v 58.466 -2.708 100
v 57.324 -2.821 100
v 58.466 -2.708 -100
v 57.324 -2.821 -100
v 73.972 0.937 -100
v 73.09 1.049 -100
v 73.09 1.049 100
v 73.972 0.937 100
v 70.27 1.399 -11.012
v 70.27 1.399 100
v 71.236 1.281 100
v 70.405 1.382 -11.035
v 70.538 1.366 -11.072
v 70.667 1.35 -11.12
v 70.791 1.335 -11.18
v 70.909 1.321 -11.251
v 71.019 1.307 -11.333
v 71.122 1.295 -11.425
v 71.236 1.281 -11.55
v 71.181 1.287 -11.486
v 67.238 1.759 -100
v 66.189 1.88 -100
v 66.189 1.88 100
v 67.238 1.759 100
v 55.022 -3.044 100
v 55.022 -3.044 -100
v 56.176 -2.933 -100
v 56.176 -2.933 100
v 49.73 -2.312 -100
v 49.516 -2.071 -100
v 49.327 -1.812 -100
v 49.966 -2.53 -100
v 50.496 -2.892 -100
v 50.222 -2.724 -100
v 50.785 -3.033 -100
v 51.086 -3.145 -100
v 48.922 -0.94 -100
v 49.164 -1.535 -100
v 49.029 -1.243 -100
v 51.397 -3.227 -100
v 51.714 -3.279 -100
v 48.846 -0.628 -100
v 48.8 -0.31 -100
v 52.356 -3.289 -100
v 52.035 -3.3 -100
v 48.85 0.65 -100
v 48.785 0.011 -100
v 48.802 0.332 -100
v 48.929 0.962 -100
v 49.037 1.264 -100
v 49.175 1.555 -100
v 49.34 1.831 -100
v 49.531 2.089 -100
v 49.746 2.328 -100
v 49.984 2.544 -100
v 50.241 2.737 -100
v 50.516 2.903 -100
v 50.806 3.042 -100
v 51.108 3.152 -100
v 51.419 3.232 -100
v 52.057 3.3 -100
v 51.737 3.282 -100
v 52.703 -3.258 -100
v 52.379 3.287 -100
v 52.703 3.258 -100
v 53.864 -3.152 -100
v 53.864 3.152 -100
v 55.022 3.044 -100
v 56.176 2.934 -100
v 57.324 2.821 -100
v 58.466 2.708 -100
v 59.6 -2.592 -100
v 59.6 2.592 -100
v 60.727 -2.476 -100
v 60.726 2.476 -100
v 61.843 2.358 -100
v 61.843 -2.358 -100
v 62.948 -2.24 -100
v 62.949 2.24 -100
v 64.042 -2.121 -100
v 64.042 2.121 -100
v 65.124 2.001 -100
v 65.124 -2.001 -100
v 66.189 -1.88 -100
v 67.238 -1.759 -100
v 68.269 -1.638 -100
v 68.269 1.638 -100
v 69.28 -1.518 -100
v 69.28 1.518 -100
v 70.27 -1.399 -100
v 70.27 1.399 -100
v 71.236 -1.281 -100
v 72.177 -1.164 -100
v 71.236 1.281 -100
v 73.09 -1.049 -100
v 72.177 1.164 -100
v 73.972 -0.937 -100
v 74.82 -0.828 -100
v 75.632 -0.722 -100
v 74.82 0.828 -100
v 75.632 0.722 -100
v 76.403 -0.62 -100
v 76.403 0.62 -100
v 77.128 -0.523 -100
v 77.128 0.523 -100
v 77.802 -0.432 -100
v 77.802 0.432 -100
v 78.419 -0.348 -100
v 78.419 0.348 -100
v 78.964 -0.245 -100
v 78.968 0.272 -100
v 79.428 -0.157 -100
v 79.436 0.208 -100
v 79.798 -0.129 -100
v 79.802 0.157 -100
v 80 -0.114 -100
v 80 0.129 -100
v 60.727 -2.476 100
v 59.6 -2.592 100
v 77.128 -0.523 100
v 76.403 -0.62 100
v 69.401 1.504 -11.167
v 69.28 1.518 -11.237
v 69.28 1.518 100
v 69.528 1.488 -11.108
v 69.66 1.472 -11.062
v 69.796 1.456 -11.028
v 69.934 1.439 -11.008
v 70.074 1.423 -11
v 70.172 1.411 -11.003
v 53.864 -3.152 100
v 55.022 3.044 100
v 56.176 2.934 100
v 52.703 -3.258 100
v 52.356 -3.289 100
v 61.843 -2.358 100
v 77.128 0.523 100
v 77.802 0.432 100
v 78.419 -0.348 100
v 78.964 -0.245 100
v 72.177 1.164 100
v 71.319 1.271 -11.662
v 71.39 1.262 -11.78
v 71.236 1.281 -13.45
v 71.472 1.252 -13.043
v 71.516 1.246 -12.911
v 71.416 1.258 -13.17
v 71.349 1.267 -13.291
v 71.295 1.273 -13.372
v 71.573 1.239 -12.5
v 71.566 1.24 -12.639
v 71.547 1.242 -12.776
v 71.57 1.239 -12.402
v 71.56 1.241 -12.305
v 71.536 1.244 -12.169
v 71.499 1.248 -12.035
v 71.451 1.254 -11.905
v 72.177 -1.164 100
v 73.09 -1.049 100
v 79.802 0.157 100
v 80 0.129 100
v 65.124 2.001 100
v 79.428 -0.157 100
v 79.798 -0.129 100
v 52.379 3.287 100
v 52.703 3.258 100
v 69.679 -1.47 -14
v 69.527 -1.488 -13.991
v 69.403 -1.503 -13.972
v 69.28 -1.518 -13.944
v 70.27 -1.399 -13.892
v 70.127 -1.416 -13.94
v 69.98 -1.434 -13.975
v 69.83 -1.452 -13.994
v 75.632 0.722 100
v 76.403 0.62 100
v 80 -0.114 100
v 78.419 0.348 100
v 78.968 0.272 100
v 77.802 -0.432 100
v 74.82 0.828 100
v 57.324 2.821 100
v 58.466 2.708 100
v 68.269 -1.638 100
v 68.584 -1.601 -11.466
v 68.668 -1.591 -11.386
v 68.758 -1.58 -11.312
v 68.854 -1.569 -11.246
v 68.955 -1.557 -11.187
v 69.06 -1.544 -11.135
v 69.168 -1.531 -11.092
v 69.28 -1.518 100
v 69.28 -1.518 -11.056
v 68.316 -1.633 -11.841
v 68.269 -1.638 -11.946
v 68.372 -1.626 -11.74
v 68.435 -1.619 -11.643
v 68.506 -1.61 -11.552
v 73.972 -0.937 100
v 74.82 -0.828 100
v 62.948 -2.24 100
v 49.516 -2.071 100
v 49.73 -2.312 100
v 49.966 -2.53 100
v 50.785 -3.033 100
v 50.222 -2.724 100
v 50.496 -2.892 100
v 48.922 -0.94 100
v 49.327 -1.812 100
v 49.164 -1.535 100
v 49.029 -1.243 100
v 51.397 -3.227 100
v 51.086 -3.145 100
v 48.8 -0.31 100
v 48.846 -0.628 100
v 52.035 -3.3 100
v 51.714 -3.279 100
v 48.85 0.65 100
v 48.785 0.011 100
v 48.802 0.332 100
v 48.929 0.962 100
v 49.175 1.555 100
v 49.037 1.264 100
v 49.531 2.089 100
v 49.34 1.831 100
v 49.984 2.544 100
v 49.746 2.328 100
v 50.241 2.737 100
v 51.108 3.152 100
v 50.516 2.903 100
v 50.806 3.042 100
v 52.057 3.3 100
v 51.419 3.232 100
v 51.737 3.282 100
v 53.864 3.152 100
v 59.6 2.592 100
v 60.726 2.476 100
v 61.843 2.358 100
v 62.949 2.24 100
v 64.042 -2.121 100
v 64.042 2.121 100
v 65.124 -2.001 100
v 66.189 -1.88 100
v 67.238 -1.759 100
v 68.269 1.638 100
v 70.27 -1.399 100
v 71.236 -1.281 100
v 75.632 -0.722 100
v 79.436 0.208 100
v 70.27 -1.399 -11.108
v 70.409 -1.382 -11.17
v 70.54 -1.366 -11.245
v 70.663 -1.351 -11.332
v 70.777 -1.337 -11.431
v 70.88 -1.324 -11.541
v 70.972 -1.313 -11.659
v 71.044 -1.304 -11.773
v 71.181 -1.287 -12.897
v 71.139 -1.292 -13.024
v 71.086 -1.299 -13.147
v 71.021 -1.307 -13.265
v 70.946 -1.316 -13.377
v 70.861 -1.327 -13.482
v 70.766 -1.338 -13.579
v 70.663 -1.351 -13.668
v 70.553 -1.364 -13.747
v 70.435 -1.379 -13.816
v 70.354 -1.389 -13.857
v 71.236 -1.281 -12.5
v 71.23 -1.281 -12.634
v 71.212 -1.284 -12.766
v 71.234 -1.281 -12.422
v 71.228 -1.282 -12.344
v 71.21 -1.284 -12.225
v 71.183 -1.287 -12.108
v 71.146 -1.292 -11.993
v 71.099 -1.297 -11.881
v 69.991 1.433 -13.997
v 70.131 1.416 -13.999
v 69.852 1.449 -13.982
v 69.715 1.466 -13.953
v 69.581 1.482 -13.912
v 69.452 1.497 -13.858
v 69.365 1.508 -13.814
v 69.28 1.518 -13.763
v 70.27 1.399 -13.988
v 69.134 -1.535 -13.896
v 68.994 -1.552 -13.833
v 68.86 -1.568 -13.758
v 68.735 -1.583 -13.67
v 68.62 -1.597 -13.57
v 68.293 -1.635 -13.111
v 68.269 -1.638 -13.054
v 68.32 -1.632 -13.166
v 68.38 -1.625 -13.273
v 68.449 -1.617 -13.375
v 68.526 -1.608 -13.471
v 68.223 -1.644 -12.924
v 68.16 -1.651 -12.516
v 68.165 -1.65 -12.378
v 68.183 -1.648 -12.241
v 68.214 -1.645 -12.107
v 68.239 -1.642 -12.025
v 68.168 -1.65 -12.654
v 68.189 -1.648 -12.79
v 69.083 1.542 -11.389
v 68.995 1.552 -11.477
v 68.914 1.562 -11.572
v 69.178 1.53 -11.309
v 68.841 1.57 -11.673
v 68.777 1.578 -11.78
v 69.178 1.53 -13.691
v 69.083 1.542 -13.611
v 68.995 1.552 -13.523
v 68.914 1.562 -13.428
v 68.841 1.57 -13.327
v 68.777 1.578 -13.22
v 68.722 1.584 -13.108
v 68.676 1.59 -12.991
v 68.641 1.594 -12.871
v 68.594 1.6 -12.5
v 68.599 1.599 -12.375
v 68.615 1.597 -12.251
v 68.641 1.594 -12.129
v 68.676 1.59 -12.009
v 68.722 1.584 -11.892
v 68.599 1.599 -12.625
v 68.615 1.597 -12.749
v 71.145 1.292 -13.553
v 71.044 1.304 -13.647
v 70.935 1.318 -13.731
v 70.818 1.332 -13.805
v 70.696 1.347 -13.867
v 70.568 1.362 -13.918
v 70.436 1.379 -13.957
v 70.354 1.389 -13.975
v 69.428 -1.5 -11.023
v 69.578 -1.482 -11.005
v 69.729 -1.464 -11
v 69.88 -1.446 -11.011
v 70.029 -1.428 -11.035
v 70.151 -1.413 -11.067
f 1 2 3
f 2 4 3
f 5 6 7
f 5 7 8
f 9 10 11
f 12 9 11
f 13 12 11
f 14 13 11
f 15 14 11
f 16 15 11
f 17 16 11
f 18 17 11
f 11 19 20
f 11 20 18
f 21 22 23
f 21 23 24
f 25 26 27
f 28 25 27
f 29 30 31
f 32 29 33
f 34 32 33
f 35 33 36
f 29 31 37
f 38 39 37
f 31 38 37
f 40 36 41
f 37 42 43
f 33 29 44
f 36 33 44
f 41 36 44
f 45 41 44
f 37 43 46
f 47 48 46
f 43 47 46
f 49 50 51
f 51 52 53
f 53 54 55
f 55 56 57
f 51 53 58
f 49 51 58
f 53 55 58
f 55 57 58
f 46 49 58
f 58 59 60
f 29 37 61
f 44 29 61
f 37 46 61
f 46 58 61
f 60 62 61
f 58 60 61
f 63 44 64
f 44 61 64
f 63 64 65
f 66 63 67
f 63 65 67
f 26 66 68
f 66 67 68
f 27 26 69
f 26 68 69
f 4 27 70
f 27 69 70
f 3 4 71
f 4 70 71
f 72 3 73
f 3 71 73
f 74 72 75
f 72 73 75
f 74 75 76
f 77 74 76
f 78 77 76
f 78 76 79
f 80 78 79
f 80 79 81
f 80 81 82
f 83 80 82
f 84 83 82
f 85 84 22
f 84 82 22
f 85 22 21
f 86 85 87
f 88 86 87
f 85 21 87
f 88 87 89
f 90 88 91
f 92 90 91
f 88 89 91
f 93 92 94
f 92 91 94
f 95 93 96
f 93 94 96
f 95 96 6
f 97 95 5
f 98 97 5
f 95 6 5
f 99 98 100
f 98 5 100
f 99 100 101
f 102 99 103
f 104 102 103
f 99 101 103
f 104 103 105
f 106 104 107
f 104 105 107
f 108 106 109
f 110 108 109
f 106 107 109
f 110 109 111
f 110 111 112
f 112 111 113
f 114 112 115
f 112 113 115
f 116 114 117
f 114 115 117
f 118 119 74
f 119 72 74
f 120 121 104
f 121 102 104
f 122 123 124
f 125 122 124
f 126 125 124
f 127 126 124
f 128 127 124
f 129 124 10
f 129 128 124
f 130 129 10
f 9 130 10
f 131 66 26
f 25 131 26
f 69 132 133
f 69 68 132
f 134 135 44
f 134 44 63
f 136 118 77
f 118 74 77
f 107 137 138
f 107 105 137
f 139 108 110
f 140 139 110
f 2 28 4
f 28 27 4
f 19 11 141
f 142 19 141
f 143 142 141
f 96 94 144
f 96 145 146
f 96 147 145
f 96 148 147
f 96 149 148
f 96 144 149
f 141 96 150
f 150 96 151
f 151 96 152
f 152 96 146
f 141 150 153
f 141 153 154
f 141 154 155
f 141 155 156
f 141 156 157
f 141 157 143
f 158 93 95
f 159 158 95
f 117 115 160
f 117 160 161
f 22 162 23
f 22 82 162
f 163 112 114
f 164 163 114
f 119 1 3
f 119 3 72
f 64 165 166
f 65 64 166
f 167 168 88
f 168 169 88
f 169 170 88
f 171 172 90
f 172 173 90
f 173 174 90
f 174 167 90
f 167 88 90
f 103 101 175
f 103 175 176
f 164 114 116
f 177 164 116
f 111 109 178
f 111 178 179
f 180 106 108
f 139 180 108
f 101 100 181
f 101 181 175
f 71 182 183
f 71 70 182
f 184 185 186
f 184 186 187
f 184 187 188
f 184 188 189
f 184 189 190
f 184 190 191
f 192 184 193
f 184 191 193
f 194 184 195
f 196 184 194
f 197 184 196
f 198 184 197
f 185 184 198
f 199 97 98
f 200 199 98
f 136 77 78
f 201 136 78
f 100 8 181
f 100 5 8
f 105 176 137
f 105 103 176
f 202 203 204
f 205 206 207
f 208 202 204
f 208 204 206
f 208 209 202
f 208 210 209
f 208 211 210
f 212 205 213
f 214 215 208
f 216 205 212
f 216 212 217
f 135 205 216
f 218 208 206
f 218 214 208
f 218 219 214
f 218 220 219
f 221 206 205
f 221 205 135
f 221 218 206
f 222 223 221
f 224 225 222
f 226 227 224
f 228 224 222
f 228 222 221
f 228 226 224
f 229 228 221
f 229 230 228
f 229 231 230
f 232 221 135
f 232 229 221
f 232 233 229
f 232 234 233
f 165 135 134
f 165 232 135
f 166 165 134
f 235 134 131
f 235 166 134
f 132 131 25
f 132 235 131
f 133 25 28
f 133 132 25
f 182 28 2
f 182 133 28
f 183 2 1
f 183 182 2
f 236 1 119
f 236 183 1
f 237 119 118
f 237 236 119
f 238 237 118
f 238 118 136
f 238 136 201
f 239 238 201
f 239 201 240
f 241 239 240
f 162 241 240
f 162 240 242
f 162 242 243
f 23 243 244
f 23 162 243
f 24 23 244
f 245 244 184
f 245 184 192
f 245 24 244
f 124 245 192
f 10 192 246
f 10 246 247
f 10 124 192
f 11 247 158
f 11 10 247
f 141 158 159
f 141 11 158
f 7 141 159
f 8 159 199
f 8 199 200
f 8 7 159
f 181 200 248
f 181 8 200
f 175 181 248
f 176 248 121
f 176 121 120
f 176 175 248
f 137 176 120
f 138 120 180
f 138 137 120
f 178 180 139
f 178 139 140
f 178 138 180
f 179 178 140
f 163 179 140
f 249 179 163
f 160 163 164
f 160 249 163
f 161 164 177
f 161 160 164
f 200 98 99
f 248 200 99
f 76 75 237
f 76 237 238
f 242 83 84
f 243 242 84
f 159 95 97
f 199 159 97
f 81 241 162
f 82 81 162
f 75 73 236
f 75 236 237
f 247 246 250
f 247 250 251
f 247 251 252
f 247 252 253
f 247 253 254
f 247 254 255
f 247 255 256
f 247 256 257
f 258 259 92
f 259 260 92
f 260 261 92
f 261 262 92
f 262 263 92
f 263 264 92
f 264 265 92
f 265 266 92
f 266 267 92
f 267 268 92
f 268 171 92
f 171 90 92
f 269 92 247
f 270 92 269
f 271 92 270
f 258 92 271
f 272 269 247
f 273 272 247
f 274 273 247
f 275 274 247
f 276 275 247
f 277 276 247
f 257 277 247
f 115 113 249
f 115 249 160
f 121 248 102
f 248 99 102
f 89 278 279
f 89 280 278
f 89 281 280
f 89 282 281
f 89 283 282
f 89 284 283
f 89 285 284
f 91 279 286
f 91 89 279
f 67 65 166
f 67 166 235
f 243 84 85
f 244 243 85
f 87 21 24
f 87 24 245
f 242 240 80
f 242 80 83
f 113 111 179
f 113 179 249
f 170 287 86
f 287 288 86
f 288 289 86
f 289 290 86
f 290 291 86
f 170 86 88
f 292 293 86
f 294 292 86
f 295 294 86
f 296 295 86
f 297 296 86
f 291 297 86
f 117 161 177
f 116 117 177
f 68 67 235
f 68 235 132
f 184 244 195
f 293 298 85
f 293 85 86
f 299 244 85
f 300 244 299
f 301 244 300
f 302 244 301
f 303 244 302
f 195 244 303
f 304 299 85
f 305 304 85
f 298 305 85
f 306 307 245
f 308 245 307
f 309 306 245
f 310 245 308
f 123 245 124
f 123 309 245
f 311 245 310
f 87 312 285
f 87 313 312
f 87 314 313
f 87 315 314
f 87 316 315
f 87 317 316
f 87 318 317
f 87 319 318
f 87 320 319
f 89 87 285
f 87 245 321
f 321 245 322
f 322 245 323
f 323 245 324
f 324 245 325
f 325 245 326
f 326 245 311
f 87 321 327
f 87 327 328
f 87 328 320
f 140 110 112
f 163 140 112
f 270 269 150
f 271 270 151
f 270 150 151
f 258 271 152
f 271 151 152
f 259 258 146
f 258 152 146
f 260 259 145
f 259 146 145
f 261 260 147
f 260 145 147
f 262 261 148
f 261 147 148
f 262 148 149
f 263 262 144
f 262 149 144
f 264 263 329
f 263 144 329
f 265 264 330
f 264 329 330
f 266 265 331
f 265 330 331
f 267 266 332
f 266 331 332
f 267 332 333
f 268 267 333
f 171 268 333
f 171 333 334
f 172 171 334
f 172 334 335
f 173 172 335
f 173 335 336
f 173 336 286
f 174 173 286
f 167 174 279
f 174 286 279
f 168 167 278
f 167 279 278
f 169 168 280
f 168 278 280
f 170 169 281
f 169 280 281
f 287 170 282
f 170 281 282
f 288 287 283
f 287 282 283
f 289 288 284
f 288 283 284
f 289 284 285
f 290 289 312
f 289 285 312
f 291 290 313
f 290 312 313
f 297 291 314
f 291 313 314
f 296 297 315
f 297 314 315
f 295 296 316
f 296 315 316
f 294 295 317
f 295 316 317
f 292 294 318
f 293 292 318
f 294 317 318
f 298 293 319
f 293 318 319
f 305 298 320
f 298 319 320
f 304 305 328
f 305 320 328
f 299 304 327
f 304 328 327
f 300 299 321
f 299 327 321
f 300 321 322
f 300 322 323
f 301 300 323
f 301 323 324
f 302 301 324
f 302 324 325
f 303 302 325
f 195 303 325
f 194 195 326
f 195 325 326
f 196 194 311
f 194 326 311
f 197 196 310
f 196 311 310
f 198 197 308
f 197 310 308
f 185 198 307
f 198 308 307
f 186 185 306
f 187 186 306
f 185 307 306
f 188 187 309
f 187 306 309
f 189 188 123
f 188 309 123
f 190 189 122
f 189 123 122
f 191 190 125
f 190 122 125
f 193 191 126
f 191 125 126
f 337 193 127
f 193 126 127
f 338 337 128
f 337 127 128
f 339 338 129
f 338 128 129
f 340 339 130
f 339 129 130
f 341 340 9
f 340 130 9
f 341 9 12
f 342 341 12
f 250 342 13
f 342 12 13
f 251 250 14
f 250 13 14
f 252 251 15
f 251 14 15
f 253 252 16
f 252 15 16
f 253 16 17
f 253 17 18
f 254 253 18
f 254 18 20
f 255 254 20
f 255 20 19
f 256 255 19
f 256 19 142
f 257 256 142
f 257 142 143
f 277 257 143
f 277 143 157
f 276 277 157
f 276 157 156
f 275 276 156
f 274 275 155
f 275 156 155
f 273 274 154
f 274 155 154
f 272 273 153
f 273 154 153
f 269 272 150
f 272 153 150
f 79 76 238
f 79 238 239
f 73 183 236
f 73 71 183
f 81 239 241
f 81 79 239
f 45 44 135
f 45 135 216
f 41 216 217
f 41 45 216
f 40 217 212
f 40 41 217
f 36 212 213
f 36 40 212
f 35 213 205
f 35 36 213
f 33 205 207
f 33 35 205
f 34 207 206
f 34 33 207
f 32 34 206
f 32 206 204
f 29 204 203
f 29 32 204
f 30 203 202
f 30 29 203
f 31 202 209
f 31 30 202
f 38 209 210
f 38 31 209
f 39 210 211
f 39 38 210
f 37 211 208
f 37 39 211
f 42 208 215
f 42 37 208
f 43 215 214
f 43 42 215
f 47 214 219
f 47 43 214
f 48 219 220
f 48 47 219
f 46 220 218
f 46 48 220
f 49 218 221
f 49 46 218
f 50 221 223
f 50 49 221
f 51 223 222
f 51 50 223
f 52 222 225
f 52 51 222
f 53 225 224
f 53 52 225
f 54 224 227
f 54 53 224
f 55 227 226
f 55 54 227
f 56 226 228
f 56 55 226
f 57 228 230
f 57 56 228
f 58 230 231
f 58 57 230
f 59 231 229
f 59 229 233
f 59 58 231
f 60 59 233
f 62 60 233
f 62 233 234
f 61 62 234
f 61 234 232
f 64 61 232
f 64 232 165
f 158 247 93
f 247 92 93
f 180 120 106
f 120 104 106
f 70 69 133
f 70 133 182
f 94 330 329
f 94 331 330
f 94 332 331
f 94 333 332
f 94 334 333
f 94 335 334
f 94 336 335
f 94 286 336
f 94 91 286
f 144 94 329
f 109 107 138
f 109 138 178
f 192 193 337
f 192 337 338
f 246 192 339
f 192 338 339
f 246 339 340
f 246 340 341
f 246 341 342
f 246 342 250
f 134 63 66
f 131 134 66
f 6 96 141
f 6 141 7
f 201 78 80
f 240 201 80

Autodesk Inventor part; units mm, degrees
ref_plane "YZ Plane" through (0, 0, 0) normal (1, 0, 0) x (0, 1, 0)
ref_plane "XZ Plane" through (0, 0, 0) normal (0, 1, 0) x (-1, 0, 0)
ref_plane "XY Plane" through (0, 0, 0) normal (0, 0, 1) x (1, 0, 0)
sketch "Náčrt1" plane through (0, 0, 0) normal (0, 0, 1) x (1, 0, 0)
  line L0 (52.3561, -3.2889) -> (52.7026, -3.258)
  line L1 (52.7026, -3.258) -> (53.8641, -3.1519)
  line L2 (53.8641, -3.1519) -> (55.0221, -3.0436)
  line L3 (55.0221, -3.0436) -> (56.1757, -2.9334)
  line L4 (56.1757, -2.9334) -> (57.324, -2.8213)
  line L5 (57.324, -2.8213) -> (58.466, -2.7076)
  line L6 (58.466, -2.7076) -> (59.6005, -2.5924)
  line L7 (59.6005, -2.5924) -> (60.7266, -2.476)
  line L8 (60.7266, -2.476) -> (61.843, -2.3584)
  line L9 (61.843, -2.3584) -> (62.9485, -2.2399)
  line L10 (62.9485, -2.2399) -> (64.0421, -2.1207)
  line L11 (64.0421, -2.1207) -> (65.124, -2.0008)
  line L12 (65.124, -2.0008) -> (66.1891, -1.8799)
  line L13 (66.1891, -1.8799) -> (67.2379, -1.7589)
  line L14 (67.2379, -1.7589) -> (68.2689, -1.6383)
  line L15 (68.2689, -1.6383) -> (69.2801, -1.5181)
  line L16 (69.2801, -1.5181) -> (70.27, -1.3988)
  line L17 (70.27, -1.3988) -> (71.2363, -1.2806)
  line L18 (71.2363, -1.2806) -> (72.1771, -1.164)
  line L19 (72.1771, -1.164) -> (73.0899, -1.0493)
  line L20 (73.0899, -1.0493) -> (73.972, -0.937)
  line L21 (73.972, -0.937) -> (74.8205, -0.8276)
  line L22 (74.8205, -0.8276) -> (75.6321, -0.7216)
  line L23 (75.6321, -0.7216) -> (76.4028, -0.6198)
  line L24 (76.4028, -0.6198) -> (77.1281, -0.5229)
  line L25 (77.1281, -0.5229) -> (77.8025, -0.4319)
  line L26 (77.8025, -0.4319) -> (78.4188, -0.3479)
  line L27 (78.4188, -0.3479) -> (78.9642, -0.245)
  line L28 (78.9642, -0.245) -> (79.4284, -0.1574)
  line L29 (79.4284, -0.1574) -> (79.7982, -0.1291)
  line L30 (79.7982, -0.1291) -> (80, -0.1136)
  line L31 (52.3786, 3.287) -> (52.7026, 3.2581)
  line L32 (52.7026, 3.2581) -> (53.864, 3.152)
  line L33 (53.864, 3.152) -> (55.022, 3.0437)
  line L34 (55.022, 3.0437) -> (56.1756, 2.9335)
  line L35 (56.1756, 2.9335) -> (57.3239, 2.8214)
  line L36 (57.3239, 2.8214) -> (58.4658, 2.7077)
  line L37 (58.4658, 2.7077) -> (59.6004, 2.5925)
  line L38 (59.6004, 2.5925) -> (60.7264, 2.4761)
  line L39 (60.7264, 2.4761) -> (61.843, 2.3585)
  line L40 (61.843, 2.3585) -> (62.9486, 2.24)
  line L41 (62.9486, 2.24) -> (64.0421, 2.1208)
  line L42 (64.0421, 2.1208) -> (65.124, 2.0009)
  line L43 (65.124, 2.0009) -> (66.1891, 1.88)
  line L44 (66.1891, 1.88) -> (67.238, 1.759)
  line L45 (67.238, 1.759) -> (68.2689, 1.6383)
  line L46 (68.2689, 1.6383) -> (69.2801, 1.5182)
  line L47 (69.2801, 1.5182) -> (70.27, 1.3989)
  line L48 (70.27, 1.3989) -> (71.2364, 1.2807)
  line L49 (71.2364, 1.2807) -> (72.1771, 1.1641)
  line L50 (72.1771, 1.1641) -> (73.0899, 1.0494)
  line L51 (73.0899, 1.0494) -> (73.972, 0.937)
  line L52 (73.972, 0.937) -> (74.8205, 0.8276)
  line L53 (74.8205, 0.8276) -> (75.6321, 0.7217)
  line L54 (75.6321, 0.7217) -> (76.4028, 0.6199)
  line L55 (76.4028, 0.6199) -> (77.1281, 0.523)
  line L56 (77.1281, 0.523) -> (77.8025, 0.432)
  line L57 (77.8025, 0.432) -> (78.4188, 0.348)
  line L58 (78.4188, 0.348) -> (78.9679, 0.2725)
  line L59 (78.9679, 0.2725) -> (79.4365, 0.208)
  line L60 (79.4365, 0.208) -> (79.8021, 0.1566)
  line L61 (79.8021, 0.1566) -> (80, 0.1287)
  line L62 (80, 0.1287) -> (80, -0.1136)
  line L63 (49.176, -1.5573) -> (50.2021, -1.4704)
  line L64 (50.2021, -1.4704) -> (51.3632, -1.3695)
  line L65 (51.3632, -1.3695) -> (52.5228, -1.2661)
  line L66 (52.5228, -1.2661) -> (53.68, -1.1604)
  line L67 (53.68, -1.1604) -> (54.8339, -1.0525)
  line L68 (54.8339, -1.0525) -> (55.9835, -0.9426)
  line L69 (55.9835, -0.9426) -> (57.1278, -0.831)
  line L70 (57.1278, -0.831) -> (58.2659, -0.7176)
  line L71 (58.2659, -0.7176) -> (59.3966, -0.6029)
  line L72 (59.3966, -0.6029) -> (60.519, -0.4868)
  line L73 (60.519, -0.4868) -> (61.6317, -0.3696)
  line L74 (61.6317, -0.3696) -> (62.7336, -0.2515)
  line L75 (62.7336, -0.2515) -> (63.8236, -0.1327)
  line L76 (63.8236, -0.1327) -> (65.0211, 0)
  line L77 (65.0211, 0) -> (63.8236, 0.1327)
  line L78 (63.8236, 0.1327) -> (62.7337, 0.2516)
  line L79 (62.7337, 0.2516) -> (61.6317, 0.3697)
  line L80 (61.6317, 0.3697) -> (60.5188, 0.4869)
  line L81 (60.5188, 0.4869) -> (59.3965, 0.6029)
  line L82 (59.3965, 0.6029) -> (58.2657, 0.7177)
  line L83 (58.2657, 0.7177) -> (57.1277, 0.831)
  line L84 (57.1277, 0.831) -> (55.9833, 0.9427)
  line L85 (55.9833, 0.9427) -> (54.8338, 1.0526)
  line L86 (54.8338, 1.0526) -> (53.6799, 1.1604)
  line L87 (53.6799, 1.1604) -> (52.5228, 1.2662)
  line L88 (52.5228, 1.2662) -> (51.3632, 1.3696)
  line L89 (51.3632, 1.3696) -> (50.2021, 1.4705)
  line L90 (50.2021, 1.4705) -> (49.0403, 1.5688)
  arc A0 (52.3786, 3.287) -> (52.401, -3.2849) centre (52.0854, 0) ccw
  dimension "d10" = 3.3
extrude "Vysunutí1" add sketch "Náčrt1" along normal mid plane 200
sketch "Náčrt2" plane through (76.4028, 0.6199, 100) normal (0.1324, 0.9912, 0) x (0.9912, -0.1324, 0)
  circle A0 centre (-6.3695, 112.5) radius 1.5
  line L0 (3.6305, 200) -> (3.6305, 0) projected
  circle A1 centre (-6.3695, 112.5) radius 5
  point P0 (-75.6482, 100)
  point P1 (3.6305, 100)
  dimension "d14" = 3
  dimension "d15" = 12.5
  dimension "d17" = 10
  dimension "d23" = 10
extrude "Vysunutí6" cut sketch "Náčrt2" along normal through all both and the other way through all contours A0
sketch "Náčrt4" plane through (0, 0, 100) normal (0, 0, 1) x (1, 0, 0)
  arc A0 (52.3786, 3.287) -> (52.3561, -3.2889) centre (52.0854, 0) ccw projected
  circle A1 centre (52.0854, 0) radius 2
  circle A2 centre (57.0854, 0) radius 1.5
  point P0 (0, 0)
  dimension "d31" = 4
  dimension "d32" = 3
  dimension "d33" = 5
extrude "Vysunutí7" [suppressed]
properties part number "horizontal_stab_elevator"
